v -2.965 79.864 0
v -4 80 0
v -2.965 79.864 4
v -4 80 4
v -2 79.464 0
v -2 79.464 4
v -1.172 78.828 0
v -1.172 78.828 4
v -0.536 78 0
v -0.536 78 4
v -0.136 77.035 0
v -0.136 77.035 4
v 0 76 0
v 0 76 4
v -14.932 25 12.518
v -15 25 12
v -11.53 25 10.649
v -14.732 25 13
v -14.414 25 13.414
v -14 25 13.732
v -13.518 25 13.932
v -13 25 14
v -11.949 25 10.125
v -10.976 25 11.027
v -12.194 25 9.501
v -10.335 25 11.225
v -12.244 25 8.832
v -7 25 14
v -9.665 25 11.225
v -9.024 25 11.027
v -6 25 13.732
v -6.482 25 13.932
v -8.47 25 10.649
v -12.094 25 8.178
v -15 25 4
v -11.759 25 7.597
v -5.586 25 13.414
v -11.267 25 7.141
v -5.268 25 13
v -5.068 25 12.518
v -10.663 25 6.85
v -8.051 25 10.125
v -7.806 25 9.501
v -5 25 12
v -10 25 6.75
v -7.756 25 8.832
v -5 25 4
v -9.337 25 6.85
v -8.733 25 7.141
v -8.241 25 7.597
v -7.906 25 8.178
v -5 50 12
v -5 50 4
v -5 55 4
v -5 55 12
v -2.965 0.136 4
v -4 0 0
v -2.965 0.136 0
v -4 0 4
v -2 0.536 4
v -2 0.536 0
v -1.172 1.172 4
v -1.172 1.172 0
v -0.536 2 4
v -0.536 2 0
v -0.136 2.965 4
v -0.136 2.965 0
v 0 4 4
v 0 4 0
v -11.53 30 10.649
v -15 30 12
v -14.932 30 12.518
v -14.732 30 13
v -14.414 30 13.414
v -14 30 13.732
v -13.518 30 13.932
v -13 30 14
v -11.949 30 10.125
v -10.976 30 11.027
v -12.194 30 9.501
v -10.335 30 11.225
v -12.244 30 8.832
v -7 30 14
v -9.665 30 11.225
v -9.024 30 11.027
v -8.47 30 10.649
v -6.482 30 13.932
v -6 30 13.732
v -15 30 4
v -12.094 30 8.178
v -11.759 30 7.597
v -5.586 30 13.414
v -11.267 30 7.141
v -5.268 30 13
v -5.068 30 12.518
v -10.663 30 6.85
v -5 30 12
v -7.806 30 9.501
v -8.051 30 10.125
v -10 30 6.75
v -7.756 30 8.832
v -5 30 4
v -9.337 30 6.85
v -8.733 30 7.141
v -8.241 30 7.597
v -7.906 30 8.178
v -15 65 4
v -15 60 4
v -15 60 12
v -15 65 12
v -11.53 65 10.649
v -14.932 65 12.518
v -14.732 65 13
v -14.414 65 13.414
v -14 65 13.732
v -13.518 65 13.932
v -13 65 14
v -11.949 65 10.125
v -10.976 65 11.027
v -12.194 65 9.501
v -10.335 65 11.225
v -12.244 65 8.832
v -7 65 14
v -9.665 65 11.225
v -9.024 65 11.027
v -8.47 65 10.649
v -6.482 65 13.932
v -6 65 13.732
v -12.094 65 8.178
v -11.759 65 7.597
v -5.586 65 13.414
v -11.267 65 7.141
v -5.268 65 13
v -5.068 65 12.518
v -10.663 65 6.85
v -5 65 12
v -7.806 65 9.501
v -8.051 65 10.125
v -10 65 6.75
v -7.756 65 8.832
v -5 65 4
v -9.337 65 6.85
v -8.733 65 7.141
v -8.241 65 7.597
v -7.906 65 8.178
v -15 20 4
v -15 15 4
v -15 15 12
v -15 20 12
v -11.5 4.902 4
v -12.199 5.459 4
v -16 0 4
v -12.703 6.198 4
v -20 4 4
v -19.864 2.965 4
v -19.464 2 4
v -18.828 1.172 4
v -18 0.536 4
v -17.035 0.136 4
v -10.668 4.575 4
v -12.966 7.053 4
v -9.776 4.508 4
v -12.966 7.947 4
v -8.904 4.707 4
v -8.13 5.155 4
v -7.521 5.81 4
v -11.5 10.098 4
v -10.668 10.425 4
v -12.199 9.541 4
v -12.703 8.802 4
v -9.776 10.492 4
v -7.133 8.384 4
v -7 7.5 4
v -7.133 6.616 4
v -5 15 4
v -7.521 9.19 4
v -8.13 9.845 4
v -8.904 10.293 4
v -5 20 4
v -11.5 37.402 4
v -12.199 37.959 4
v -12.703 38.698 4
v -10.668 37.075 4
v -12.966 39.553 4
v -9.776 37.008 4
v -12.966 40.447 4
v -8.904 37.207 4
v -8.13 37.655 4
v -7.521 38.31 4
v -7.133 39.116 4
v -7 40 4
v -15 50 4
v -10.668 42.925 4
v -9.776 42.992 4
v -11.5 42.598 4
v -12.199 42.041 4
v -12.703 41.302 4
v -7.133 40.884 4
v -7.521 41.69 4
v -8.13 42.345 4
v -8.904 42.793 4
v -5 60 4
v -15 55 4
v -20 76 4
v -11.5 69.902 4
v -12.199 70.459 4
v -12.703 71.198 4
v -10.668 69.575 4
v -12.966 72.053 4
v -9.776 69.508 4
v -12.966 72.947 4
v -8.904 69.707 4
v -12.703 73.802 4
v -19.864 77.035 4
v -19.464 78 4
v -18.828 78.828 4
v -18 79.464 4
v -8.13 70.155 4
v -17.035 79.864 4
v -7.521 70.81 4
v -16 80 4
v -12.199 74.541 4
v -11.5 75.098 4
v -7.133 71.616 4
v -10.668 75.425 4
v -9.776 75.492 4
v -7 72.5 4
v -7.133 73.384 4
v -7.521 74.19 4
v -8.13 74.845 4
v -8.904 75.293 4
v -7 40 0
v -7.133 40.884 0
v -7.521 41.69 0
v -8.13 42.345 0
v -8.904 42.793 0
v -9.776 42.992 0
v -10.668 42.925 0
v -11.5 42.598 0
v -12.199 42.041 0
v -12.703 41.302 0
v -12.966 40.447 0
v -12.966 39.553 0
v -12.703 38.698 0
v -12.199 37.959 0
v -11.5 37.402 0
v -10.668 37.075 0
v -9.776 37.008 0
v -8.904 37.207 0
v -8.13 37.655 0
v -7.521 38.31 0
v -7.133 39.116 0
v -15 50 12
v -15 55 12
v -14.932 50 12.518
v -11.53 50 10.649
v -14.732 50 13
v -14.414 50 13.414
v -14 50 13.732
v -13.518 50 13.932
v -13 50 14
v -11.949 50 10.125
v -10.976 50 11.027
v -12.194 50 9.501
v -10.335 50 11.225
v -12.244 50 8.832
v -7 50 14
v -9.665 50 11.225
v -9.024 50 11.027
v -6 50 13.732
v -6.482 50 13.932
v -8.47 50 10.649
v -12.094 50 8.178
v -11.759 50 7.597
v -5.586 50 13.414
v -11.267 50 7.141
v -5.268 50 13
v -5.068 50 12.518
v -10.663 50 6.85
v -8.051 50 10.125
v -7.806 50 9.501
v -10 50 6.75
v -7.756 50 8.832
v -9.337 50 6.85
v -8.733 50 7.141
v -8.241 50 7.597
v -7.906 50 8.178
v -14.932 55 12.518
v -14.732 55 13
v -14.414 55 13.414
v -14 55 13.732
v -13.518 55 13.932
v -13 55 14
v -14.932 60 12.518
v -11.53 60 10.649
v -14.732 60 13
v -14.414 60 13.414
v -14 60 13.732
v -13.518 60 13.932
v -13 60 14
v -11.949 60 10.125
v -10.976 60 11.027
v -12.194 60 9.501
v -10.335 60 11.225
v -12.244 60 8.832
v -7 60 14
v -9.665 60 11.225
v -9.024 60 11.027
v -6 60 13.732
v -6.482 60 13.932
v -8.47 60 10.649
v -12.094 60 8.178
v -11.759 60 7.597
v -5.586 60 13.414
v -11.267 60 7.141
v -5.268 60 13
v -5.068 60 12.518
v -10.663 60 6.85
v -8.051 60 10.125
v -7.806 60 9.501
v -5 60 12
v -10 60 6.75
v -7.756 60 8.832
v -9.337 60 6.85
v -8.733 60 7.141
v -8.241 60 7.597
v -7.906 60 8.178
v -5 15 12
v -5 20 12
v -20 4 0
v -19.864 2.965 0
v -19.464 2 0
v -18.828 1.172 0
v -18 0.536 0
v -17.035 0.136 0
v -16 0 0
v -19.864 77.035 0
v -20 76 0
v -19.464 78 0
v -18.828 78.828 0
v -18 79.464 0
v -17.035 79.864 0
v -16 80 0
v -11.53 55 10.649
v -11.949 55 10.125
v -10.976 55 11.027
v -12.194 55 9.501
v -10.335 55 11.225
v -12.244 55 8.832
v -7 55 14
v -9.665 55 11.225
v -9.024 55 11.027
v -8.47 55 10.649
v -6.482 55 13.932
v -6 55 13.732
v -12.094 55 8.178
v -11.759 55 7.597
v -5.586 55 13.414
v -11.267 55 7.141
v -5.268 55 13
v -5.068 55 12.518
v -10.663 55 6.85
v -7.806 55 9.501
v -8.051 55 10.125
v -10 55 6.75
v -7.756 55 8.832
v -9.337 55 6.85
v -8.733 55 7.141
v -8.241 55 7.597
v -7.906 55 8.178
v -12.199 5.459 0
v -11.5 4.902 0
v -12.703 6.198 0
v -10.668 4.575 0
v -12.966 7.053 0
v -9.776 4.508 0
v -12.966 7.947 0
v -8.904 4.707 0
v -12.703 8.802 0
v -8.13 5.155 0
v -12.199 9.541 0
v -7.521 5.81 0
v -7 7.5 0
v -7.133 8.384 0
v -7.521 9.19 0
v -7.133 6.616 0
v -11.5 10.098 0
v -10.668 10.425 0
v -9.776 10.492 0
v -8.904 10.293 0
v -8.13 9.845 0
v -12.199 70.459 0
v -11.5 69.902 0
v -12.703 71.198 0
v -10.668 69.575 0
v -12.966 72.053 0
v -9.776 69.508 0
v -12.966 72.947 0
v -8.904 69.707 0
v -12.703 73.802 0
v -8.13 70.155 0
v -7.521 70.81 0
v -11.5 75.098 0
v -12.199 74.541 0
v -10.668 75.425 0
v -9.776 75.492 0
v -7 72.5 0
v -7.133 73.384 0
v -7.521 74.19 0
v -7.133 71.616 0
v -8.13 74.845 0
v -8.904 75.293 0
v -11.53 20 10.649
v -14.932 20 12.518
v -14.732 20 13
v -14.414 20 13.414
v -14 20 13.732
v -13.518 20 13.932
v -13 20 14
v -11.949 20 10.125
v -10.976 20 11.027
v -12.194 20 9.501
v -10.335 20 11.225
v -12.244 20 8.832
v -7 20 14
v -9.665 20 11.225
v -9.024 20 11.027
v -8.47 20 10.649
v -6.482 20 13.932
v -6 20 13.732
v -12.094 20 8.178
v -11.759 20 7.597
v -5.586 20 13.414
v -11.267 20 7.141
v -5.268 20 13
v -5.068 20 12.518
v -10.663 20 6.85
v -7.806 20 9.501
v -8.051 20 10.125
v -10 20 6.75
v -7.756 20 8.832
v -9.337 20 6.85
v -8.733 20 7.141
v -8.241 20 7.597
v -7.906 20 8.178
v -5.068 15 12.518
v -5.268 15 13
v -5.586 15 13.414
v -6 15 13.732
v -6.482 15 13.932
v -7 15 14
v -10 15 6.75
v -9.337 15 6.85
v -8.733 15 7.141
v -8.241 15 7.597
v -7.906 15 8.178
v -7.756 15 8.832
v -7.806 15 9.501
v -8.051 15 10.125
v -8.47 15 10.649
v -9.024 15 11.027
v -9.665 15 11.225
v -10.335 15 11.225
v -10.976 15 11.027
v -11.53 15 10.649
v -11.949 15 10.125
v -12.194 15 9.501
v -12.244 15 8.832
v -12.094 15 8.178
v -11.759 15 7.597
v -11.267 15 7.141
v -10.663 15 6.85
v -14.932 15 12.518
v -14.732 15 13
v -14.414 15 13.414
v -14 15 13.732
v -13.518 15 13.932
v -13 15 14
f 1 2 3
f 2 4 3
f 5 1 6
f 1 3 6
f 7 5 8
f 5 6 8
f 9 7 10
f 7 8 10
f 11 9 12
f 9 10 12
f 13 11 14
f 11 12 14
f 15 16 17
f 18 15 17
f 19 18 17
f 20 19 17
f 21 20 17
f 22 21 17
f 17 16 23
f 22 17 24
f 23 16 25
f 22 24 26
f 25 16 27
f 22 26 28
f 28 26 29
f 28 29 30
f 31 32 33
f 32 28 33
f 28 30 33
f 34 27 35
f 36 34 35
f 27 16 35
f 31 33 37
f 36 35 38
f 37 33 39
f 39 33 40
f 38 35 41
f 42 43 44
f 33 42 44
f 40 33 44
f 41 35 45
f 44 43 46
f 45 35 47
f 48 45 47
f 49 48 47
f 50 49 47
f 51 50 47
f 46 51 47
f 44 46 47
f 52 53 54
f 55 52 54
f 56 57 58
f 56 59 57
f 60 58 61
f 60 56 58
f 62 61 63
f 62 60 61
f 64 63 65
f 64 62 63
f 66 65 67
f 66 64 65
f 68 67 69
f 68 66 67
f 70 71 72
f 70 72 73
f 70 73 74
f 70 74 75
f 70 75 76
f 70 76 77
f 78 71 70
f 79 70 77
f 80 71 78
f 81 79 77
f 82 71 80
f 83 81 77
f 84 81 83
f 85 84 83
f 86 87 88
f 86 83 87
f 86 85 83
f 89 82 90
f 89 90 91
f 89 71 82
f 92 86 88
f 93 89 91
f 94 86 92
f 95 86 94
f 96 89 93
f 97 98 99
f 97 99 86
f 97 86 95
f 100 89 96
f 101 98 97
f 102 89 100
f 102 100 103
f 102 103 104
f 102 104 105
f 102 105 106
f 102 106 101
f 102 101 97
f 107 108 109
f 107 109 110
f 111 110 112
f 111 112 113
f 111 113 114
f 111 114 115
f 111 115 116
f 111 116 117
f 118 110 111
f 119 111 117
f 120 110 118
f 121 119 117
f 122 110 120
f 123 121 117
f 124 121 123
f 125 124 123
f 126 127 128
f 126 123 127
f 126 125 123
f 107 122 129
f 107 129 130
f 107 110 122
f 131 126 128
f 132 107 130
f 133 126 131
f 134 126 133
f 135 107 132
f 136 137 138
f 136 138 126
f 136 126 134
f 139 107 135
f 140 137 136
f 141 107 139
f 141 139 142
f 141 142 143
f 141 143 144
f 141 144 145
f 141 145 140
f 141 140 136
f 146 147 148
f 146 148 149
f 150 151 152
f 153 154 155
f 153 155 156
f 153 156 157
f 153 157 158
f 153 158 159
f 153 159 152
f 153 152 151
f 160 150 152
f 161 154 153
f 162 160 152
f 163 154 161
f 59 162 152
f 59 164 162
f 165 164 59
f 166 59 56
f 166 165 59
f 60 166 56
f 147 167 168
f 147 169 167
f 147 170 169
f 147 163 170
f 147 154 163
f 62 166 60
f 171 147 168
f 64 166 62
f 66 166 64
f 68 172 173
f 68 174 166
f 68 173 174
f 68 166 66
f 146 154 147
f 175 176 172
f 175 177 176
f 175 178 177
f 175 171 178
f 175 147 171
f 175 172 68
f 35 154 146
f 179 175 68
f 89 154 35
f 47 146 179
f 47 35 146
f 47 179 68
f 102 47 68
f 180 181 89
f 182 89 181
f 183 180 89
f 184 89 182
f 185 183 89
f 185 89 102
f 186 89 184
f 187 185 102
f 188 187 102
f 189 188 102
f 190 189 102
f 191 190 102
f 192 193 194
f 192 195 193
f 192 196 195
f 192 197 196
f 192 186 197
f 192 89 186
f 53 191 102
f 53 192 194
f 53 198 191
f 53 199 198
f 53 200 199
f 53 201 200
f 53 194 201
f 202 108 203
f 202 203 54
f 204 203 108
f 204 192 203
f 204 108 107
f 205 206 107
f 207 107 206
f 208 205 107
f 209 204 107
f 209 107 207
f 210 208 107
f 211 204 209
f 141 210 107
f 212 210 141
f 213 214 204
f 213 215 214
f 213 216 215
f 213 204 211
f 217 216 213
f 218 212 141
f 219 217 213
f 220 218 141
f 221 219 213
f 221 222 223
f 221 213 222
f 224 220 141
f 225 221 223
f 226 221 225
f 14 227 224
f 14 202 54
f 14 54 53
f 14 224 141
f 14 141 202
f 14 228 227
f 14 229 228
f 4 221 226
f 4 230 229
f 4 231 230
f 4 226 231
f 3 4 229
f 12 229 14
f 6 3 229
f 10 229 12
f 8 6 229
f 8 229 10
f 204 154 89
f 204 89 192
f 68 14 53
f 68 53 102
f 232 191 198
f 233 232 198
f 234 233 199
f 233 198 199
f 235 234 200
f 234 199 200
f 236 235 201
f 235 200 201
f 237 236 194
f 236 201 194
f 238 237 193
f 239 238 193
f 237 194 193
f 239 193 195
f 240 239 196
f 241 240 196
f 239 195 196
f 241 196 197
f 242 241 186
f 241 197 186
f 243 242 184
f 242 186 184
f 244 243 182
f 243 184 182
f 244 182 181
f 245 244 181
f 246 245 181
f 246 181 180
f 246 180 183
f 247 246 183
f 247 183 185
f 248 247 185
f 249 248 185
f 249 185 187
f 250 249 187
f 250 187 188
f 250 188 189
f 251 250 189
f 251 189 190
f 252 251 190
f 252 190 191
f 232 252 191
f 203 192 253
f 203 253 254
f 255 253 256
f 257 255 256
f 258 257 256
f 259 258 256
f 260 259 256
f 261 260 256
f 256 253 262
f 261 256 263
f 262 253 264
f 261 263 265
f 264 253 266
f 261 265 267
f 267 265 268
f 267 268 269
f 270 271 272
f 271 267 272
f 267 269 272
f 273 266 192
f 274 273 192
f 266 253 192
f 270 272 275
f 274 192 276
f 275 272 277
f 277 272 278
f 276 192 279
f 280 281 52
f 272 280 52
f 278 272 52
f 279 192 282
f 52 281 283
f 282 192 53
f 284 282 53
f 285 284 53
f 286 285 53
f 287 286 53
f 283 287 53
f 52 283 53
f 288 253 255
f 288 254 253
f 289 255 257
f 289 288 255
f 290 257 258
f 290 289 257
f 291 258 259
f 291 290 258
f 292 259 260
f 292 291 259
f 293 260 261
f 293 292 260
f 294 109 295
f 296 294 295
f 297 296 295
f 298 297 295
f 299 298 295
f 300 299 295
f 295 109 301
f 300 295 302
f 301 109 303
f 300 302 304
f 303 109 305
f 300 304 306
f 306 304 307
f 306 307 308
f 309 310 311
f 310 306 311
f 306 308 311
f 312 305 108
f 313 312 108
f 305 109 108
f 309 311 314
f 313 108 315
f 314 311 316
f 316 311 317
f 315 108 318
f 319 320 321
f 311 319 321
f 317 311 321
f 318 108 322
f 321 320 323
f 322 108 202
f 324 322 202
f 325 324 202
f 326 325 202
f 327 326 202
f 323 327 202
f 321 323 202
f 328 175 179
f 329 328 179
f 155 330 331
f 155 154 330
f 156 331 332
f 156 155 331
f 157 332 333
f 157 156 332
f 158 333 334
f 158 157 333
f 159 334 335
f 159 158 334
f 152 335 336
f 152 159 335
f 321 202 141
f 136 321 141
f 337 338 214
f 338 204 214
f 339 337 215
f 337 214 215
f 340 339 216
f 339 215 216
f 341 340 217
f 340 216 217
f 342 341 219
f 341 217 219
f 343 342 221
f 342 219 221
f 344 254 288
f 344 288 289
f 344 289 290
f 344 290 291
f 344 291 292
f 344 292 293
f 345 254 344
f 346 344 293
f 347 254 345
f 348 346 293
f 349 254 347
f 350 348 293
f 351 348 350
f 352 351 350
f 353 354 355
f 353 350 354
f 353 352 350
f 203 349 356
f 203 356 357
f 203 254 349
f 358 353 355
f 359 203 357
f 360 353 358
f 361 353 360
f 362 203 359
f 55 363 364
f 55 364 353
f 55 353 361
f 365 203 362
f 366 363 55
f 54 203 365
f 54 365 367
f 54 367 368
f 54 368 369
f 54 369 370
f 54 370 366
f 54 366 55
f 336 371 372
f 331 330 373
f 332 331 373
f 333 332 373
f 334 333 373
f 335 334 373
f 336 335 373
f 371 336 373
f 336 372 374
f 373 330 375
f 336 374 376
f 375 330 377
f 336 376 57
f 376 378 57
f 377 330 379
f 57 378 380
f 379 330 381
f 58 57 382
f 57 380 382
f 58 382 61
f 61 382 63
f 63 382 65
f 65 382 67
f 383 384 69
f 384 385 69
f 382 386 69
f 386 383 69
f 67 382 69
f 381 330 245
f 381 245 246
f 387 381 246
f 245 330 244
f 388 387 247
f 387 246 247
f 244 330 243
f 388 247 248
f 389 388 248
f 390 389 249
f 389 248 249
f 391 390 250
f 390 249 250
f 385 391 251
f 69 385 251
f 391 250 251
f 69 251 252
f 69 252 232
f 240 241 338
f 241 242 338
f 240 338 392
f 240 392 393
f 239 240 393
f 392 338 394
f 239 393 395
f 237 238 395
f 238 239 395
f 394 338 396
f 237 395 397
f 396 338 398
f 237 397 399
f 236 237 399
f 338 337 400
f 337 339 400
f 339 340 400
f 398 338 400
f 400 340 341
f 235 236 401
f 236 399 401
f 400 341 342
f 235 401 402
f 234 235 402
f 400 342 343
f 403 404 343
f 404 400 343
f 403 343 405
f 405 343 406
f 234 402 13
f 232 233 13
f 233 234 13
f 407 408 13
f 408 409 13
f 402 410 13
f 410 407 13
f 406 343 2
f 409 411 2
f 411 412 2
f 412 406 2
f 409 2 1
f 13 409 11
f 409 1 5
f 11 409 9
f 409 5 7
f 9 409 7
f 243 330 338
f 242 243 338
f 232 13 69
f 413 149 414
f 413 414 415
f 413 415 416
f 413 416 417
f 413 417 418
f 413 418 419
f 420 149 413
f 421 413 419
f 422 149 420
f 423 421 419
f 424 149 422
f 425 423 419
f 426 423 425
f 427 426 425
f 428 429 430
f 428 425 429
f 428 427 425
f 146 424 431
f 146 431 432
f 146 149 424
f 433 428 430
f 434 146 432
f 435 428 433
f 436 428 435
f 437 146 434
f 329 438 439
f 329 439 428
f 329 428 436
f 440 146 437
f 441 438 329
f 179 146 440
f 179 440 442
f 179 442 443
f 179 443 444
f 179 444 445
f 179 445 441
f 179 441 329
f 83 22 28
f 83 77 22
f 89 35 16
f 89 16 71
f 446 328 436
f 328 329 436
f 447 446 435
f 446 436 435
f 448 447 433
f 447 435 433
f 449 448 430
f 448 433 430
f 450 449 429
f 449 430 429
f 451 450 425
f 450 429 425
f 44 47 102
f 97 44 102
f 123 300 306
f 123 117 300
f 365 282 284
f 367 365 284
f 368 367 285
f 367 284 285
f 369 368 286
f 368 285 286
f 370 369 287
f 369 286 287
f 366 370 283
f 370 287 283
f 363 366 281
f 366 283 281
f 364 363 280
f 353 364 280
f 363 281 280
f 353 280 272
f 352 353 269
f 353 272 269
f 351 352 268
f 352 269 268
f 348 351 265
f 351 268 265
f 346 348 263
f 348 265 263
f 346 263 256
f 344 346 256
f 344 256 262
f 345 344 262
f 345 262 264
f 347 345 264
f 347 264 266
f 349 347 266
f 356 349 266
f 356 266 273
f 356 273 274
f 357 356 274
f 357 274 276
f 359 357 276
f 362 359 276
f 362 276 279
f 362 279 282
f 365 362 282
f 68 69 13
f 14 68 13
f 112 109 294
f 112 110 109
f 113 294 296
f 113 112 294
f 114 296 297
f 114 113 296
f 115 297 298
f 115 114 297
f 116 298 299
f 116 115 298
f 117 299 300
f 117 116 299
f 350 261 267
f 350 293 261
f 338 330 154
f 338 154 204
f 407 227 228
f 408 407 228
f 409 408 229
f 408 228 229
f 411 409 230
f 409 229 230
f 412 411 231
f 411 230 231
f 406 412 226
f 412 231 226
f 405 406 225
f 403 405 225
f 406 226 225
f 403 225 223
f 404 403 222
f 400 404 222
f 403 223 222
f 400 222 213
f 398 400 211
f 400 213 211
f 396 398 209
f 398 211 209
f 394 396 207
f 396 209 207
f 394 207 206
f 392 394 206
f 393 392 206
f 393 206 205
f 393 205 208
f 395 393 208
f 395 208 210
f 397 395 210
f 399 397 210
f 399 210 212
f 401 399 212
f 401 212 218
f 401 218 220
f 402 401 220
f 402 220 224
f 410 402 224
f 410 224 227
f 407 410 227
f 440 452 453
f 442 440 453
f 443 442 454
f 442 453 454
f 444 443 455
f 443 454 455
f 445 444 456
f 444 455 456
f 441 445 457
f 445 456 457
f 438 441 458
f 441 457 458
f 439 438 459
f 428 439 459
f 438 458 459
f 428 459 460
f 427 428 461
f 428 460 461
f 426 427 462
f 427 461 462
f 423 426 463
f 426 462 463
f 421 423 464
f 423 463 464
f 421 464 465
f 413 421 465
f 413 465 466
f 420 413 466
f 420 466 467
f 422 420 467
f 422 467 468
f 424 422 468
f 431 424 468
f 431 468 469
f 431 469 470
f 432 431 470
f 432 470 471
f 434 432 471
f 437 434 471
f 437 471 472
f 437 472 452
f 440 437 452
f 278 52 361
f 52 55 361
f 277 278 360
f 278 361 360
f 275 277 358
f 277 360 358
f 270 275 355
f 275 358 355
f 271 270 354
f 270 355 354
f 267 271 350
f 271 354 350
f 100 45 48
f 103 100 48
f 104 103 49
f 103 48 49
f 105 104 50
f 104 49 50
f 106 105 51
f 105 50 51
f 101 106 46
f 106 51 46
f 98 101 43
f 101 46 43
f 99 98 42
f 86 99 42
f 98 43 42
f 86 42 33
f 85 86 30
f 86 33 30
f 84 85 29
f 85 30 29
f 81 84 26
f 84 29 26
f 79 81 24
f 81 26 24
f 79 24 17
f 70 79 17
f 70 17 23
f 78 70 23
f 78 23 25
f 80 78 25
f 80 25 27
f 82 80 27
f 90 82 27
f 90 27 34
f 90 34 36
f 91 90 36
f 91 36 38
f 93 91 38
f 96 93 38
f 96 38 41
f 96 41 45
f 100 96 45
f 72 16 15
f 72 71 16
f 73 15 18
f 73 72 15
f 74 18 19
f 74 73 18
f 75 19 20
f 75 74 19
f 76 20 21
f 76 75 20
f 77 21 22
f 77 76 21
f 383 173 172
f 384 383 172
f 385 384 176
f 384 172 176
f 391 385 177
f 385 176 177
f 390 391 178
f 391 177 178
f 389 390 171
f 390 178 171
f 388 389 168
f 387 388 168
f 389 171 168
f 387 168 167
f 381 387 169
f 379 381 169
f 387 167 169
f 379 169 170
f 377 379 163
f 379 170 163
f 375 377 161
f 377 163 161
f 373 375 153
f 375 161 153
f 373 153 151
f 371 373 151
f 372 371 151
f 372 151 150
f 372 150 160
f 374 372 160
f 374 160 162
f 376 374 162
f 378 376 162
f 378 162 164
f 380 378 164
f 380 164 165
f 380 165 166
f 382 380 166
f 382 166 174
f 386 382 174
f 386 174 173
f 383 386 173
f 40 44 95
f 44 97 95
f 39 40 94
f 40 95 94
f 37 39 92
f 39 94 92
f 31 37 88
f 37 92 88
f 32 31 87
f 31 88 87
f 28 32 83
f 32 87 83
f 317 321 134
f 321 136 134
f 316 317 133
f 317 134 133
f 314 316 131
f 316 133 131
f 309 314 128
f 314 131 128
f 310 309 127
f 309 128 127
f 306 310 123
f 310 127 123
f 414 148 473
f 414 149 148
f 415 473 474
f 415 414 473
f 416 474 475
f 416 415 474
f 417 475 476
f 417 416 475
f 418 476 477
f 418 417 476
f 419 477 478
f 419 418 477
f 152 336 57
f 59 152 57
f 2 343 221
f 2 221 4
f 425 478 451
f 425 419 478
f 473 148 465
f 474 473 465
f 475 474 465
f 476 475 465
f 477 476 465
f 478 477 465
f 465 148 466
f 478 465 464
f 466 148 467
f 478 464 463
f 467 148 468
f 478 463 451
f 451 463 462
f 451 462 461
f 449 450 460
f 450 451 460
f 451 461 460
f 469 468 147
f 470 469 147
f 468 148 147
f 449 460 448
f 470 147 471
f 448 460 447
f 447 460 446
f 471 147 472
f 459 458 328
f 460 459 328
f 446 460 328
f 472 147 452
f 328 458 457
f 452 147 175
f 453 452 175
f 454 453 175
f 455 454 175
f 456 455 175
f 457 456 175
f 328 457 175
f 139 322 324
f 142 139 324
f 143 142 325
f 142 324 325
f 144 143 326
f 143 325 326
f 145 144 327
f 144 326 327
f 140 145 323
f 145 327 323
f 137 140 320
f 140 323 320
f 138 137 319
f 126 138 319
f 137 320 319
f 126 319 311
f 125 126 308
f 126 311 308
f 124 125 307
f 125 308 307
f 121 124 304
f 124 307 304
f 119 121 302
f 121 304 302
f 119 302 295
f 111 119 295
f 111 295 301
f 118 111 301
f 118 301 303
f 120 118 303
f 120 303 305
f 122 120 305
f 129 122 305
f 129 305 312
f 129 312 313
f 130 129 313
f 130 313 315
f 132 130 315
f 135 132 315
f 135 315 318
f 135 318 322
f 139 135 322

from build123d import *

# Parameters (mm, degrees)
ESQUISSE1_W             = 20
ESQUISSE1_H             = 80
BOSS_EXTRU_1_DEPTH      = 4
ESQUISSE2_W             = 10
ESQUISSE2_H             = 5
BOSS_EXTRU_2_DEPTH      = 10
ESQUISSE3_R             = 2.25
ENL_V_MAT_EXTRU_1_DEPTH = 66
CONG_1_R                = 2
CONG_2_R                = 4
ESQUISSE4_R             = 3
ENL_V_MAT_EXTRU_2_DEPTH = 5


with BuildPart() as part:
    # Esquisse1 → Boss.-Extru.1 (new body)
    with BuildSketch(Plane.XY):
        with Locations((-10, 40)):
            Rectangle(ESQUISSE1_W, ESQUISSE1_H)
    extrude(amount=BOSS_EXTRU_1_DEPTH)

    # Esquisse2 → Boss.-Extru.2 (add)
    with BuildSketch(Plane.XY.offset(4)):
        with Locations((-10, 62.5)):
            Rectangle(ESQUISSE2_W, ESQUISSE2_H)
        with Locations((-10, 52.5)):
            Rectangle(ESQUISSE2_W, ESQUISSE2_H)
        with Locations((-10, 27.5)):
            Rectangle(ESQUISSE2_W, ESQUISSE2_H)
        with Locations((-10, 17.5)):
            Rectangle(ESQUISSE2_W, ESQUISSE2_H)
    extrude(amount=BOSS_EXTRU_2_DEPTH)

    # Esquisse3 → Enlèv. mat.-Extru.1 (cut, through all)
    with BuildSketch(Plane.XZ.offset(-15)):
        with Locations(Location((-10, 9, 0), (0, 0, 270))):  # turned: the seam where the file's is
            Circle(ESQUISSE3_R)
    extrude(amount=-ENL_V_MAT_EXTRU_1_DEPTH, mode=Mode.SUBTRACT)

    # Congé1
    cong_1_edges = [part.edges().sort_by_distance(p)[0] for p in [
        (-15, 62.5, 14),
        (-5, 62.5, 14),
        (-15, 52.5, 14),
        (-5, 52.5, 14),
        (-15, 27.5, 14),
        (-5, 27.5, 14),
        (-15, 17.5, 14),
        (-5, 17.5, 14),
    ]]
    fillet(cong_1_edges, radius=CONG_1_R)

    # Congé2
    cong_2_edges = [part.edges().sort_by_distance(p)[0] for p in [
        (-20, 80, 2),
        (0, 80, 2),
        (0, 0, 2),
        (-20, 0, 2),
    ]]
    fillet(cong_2_edges, radius=CONG_2_R)

    # Esquisse4 → Enlèv. mat.-Extru.2 (cut, through all)
    with BuildSketch(Plane.XY.offset(4)):
        with Locations((-10, 7.5)):
            Circle(ESQUISSE4_R)
        with Locations((-10, 72.5)):
            Circle(ESQUISSE4_R)
        with Locations((-10, 40)):
            Circle(ESQUISSE4_R)
    extrude(amount=-ENL_V_MAT_EXTRU_2_DEPTH, mode=Mode.SUBTRACT)


solid = part.part
